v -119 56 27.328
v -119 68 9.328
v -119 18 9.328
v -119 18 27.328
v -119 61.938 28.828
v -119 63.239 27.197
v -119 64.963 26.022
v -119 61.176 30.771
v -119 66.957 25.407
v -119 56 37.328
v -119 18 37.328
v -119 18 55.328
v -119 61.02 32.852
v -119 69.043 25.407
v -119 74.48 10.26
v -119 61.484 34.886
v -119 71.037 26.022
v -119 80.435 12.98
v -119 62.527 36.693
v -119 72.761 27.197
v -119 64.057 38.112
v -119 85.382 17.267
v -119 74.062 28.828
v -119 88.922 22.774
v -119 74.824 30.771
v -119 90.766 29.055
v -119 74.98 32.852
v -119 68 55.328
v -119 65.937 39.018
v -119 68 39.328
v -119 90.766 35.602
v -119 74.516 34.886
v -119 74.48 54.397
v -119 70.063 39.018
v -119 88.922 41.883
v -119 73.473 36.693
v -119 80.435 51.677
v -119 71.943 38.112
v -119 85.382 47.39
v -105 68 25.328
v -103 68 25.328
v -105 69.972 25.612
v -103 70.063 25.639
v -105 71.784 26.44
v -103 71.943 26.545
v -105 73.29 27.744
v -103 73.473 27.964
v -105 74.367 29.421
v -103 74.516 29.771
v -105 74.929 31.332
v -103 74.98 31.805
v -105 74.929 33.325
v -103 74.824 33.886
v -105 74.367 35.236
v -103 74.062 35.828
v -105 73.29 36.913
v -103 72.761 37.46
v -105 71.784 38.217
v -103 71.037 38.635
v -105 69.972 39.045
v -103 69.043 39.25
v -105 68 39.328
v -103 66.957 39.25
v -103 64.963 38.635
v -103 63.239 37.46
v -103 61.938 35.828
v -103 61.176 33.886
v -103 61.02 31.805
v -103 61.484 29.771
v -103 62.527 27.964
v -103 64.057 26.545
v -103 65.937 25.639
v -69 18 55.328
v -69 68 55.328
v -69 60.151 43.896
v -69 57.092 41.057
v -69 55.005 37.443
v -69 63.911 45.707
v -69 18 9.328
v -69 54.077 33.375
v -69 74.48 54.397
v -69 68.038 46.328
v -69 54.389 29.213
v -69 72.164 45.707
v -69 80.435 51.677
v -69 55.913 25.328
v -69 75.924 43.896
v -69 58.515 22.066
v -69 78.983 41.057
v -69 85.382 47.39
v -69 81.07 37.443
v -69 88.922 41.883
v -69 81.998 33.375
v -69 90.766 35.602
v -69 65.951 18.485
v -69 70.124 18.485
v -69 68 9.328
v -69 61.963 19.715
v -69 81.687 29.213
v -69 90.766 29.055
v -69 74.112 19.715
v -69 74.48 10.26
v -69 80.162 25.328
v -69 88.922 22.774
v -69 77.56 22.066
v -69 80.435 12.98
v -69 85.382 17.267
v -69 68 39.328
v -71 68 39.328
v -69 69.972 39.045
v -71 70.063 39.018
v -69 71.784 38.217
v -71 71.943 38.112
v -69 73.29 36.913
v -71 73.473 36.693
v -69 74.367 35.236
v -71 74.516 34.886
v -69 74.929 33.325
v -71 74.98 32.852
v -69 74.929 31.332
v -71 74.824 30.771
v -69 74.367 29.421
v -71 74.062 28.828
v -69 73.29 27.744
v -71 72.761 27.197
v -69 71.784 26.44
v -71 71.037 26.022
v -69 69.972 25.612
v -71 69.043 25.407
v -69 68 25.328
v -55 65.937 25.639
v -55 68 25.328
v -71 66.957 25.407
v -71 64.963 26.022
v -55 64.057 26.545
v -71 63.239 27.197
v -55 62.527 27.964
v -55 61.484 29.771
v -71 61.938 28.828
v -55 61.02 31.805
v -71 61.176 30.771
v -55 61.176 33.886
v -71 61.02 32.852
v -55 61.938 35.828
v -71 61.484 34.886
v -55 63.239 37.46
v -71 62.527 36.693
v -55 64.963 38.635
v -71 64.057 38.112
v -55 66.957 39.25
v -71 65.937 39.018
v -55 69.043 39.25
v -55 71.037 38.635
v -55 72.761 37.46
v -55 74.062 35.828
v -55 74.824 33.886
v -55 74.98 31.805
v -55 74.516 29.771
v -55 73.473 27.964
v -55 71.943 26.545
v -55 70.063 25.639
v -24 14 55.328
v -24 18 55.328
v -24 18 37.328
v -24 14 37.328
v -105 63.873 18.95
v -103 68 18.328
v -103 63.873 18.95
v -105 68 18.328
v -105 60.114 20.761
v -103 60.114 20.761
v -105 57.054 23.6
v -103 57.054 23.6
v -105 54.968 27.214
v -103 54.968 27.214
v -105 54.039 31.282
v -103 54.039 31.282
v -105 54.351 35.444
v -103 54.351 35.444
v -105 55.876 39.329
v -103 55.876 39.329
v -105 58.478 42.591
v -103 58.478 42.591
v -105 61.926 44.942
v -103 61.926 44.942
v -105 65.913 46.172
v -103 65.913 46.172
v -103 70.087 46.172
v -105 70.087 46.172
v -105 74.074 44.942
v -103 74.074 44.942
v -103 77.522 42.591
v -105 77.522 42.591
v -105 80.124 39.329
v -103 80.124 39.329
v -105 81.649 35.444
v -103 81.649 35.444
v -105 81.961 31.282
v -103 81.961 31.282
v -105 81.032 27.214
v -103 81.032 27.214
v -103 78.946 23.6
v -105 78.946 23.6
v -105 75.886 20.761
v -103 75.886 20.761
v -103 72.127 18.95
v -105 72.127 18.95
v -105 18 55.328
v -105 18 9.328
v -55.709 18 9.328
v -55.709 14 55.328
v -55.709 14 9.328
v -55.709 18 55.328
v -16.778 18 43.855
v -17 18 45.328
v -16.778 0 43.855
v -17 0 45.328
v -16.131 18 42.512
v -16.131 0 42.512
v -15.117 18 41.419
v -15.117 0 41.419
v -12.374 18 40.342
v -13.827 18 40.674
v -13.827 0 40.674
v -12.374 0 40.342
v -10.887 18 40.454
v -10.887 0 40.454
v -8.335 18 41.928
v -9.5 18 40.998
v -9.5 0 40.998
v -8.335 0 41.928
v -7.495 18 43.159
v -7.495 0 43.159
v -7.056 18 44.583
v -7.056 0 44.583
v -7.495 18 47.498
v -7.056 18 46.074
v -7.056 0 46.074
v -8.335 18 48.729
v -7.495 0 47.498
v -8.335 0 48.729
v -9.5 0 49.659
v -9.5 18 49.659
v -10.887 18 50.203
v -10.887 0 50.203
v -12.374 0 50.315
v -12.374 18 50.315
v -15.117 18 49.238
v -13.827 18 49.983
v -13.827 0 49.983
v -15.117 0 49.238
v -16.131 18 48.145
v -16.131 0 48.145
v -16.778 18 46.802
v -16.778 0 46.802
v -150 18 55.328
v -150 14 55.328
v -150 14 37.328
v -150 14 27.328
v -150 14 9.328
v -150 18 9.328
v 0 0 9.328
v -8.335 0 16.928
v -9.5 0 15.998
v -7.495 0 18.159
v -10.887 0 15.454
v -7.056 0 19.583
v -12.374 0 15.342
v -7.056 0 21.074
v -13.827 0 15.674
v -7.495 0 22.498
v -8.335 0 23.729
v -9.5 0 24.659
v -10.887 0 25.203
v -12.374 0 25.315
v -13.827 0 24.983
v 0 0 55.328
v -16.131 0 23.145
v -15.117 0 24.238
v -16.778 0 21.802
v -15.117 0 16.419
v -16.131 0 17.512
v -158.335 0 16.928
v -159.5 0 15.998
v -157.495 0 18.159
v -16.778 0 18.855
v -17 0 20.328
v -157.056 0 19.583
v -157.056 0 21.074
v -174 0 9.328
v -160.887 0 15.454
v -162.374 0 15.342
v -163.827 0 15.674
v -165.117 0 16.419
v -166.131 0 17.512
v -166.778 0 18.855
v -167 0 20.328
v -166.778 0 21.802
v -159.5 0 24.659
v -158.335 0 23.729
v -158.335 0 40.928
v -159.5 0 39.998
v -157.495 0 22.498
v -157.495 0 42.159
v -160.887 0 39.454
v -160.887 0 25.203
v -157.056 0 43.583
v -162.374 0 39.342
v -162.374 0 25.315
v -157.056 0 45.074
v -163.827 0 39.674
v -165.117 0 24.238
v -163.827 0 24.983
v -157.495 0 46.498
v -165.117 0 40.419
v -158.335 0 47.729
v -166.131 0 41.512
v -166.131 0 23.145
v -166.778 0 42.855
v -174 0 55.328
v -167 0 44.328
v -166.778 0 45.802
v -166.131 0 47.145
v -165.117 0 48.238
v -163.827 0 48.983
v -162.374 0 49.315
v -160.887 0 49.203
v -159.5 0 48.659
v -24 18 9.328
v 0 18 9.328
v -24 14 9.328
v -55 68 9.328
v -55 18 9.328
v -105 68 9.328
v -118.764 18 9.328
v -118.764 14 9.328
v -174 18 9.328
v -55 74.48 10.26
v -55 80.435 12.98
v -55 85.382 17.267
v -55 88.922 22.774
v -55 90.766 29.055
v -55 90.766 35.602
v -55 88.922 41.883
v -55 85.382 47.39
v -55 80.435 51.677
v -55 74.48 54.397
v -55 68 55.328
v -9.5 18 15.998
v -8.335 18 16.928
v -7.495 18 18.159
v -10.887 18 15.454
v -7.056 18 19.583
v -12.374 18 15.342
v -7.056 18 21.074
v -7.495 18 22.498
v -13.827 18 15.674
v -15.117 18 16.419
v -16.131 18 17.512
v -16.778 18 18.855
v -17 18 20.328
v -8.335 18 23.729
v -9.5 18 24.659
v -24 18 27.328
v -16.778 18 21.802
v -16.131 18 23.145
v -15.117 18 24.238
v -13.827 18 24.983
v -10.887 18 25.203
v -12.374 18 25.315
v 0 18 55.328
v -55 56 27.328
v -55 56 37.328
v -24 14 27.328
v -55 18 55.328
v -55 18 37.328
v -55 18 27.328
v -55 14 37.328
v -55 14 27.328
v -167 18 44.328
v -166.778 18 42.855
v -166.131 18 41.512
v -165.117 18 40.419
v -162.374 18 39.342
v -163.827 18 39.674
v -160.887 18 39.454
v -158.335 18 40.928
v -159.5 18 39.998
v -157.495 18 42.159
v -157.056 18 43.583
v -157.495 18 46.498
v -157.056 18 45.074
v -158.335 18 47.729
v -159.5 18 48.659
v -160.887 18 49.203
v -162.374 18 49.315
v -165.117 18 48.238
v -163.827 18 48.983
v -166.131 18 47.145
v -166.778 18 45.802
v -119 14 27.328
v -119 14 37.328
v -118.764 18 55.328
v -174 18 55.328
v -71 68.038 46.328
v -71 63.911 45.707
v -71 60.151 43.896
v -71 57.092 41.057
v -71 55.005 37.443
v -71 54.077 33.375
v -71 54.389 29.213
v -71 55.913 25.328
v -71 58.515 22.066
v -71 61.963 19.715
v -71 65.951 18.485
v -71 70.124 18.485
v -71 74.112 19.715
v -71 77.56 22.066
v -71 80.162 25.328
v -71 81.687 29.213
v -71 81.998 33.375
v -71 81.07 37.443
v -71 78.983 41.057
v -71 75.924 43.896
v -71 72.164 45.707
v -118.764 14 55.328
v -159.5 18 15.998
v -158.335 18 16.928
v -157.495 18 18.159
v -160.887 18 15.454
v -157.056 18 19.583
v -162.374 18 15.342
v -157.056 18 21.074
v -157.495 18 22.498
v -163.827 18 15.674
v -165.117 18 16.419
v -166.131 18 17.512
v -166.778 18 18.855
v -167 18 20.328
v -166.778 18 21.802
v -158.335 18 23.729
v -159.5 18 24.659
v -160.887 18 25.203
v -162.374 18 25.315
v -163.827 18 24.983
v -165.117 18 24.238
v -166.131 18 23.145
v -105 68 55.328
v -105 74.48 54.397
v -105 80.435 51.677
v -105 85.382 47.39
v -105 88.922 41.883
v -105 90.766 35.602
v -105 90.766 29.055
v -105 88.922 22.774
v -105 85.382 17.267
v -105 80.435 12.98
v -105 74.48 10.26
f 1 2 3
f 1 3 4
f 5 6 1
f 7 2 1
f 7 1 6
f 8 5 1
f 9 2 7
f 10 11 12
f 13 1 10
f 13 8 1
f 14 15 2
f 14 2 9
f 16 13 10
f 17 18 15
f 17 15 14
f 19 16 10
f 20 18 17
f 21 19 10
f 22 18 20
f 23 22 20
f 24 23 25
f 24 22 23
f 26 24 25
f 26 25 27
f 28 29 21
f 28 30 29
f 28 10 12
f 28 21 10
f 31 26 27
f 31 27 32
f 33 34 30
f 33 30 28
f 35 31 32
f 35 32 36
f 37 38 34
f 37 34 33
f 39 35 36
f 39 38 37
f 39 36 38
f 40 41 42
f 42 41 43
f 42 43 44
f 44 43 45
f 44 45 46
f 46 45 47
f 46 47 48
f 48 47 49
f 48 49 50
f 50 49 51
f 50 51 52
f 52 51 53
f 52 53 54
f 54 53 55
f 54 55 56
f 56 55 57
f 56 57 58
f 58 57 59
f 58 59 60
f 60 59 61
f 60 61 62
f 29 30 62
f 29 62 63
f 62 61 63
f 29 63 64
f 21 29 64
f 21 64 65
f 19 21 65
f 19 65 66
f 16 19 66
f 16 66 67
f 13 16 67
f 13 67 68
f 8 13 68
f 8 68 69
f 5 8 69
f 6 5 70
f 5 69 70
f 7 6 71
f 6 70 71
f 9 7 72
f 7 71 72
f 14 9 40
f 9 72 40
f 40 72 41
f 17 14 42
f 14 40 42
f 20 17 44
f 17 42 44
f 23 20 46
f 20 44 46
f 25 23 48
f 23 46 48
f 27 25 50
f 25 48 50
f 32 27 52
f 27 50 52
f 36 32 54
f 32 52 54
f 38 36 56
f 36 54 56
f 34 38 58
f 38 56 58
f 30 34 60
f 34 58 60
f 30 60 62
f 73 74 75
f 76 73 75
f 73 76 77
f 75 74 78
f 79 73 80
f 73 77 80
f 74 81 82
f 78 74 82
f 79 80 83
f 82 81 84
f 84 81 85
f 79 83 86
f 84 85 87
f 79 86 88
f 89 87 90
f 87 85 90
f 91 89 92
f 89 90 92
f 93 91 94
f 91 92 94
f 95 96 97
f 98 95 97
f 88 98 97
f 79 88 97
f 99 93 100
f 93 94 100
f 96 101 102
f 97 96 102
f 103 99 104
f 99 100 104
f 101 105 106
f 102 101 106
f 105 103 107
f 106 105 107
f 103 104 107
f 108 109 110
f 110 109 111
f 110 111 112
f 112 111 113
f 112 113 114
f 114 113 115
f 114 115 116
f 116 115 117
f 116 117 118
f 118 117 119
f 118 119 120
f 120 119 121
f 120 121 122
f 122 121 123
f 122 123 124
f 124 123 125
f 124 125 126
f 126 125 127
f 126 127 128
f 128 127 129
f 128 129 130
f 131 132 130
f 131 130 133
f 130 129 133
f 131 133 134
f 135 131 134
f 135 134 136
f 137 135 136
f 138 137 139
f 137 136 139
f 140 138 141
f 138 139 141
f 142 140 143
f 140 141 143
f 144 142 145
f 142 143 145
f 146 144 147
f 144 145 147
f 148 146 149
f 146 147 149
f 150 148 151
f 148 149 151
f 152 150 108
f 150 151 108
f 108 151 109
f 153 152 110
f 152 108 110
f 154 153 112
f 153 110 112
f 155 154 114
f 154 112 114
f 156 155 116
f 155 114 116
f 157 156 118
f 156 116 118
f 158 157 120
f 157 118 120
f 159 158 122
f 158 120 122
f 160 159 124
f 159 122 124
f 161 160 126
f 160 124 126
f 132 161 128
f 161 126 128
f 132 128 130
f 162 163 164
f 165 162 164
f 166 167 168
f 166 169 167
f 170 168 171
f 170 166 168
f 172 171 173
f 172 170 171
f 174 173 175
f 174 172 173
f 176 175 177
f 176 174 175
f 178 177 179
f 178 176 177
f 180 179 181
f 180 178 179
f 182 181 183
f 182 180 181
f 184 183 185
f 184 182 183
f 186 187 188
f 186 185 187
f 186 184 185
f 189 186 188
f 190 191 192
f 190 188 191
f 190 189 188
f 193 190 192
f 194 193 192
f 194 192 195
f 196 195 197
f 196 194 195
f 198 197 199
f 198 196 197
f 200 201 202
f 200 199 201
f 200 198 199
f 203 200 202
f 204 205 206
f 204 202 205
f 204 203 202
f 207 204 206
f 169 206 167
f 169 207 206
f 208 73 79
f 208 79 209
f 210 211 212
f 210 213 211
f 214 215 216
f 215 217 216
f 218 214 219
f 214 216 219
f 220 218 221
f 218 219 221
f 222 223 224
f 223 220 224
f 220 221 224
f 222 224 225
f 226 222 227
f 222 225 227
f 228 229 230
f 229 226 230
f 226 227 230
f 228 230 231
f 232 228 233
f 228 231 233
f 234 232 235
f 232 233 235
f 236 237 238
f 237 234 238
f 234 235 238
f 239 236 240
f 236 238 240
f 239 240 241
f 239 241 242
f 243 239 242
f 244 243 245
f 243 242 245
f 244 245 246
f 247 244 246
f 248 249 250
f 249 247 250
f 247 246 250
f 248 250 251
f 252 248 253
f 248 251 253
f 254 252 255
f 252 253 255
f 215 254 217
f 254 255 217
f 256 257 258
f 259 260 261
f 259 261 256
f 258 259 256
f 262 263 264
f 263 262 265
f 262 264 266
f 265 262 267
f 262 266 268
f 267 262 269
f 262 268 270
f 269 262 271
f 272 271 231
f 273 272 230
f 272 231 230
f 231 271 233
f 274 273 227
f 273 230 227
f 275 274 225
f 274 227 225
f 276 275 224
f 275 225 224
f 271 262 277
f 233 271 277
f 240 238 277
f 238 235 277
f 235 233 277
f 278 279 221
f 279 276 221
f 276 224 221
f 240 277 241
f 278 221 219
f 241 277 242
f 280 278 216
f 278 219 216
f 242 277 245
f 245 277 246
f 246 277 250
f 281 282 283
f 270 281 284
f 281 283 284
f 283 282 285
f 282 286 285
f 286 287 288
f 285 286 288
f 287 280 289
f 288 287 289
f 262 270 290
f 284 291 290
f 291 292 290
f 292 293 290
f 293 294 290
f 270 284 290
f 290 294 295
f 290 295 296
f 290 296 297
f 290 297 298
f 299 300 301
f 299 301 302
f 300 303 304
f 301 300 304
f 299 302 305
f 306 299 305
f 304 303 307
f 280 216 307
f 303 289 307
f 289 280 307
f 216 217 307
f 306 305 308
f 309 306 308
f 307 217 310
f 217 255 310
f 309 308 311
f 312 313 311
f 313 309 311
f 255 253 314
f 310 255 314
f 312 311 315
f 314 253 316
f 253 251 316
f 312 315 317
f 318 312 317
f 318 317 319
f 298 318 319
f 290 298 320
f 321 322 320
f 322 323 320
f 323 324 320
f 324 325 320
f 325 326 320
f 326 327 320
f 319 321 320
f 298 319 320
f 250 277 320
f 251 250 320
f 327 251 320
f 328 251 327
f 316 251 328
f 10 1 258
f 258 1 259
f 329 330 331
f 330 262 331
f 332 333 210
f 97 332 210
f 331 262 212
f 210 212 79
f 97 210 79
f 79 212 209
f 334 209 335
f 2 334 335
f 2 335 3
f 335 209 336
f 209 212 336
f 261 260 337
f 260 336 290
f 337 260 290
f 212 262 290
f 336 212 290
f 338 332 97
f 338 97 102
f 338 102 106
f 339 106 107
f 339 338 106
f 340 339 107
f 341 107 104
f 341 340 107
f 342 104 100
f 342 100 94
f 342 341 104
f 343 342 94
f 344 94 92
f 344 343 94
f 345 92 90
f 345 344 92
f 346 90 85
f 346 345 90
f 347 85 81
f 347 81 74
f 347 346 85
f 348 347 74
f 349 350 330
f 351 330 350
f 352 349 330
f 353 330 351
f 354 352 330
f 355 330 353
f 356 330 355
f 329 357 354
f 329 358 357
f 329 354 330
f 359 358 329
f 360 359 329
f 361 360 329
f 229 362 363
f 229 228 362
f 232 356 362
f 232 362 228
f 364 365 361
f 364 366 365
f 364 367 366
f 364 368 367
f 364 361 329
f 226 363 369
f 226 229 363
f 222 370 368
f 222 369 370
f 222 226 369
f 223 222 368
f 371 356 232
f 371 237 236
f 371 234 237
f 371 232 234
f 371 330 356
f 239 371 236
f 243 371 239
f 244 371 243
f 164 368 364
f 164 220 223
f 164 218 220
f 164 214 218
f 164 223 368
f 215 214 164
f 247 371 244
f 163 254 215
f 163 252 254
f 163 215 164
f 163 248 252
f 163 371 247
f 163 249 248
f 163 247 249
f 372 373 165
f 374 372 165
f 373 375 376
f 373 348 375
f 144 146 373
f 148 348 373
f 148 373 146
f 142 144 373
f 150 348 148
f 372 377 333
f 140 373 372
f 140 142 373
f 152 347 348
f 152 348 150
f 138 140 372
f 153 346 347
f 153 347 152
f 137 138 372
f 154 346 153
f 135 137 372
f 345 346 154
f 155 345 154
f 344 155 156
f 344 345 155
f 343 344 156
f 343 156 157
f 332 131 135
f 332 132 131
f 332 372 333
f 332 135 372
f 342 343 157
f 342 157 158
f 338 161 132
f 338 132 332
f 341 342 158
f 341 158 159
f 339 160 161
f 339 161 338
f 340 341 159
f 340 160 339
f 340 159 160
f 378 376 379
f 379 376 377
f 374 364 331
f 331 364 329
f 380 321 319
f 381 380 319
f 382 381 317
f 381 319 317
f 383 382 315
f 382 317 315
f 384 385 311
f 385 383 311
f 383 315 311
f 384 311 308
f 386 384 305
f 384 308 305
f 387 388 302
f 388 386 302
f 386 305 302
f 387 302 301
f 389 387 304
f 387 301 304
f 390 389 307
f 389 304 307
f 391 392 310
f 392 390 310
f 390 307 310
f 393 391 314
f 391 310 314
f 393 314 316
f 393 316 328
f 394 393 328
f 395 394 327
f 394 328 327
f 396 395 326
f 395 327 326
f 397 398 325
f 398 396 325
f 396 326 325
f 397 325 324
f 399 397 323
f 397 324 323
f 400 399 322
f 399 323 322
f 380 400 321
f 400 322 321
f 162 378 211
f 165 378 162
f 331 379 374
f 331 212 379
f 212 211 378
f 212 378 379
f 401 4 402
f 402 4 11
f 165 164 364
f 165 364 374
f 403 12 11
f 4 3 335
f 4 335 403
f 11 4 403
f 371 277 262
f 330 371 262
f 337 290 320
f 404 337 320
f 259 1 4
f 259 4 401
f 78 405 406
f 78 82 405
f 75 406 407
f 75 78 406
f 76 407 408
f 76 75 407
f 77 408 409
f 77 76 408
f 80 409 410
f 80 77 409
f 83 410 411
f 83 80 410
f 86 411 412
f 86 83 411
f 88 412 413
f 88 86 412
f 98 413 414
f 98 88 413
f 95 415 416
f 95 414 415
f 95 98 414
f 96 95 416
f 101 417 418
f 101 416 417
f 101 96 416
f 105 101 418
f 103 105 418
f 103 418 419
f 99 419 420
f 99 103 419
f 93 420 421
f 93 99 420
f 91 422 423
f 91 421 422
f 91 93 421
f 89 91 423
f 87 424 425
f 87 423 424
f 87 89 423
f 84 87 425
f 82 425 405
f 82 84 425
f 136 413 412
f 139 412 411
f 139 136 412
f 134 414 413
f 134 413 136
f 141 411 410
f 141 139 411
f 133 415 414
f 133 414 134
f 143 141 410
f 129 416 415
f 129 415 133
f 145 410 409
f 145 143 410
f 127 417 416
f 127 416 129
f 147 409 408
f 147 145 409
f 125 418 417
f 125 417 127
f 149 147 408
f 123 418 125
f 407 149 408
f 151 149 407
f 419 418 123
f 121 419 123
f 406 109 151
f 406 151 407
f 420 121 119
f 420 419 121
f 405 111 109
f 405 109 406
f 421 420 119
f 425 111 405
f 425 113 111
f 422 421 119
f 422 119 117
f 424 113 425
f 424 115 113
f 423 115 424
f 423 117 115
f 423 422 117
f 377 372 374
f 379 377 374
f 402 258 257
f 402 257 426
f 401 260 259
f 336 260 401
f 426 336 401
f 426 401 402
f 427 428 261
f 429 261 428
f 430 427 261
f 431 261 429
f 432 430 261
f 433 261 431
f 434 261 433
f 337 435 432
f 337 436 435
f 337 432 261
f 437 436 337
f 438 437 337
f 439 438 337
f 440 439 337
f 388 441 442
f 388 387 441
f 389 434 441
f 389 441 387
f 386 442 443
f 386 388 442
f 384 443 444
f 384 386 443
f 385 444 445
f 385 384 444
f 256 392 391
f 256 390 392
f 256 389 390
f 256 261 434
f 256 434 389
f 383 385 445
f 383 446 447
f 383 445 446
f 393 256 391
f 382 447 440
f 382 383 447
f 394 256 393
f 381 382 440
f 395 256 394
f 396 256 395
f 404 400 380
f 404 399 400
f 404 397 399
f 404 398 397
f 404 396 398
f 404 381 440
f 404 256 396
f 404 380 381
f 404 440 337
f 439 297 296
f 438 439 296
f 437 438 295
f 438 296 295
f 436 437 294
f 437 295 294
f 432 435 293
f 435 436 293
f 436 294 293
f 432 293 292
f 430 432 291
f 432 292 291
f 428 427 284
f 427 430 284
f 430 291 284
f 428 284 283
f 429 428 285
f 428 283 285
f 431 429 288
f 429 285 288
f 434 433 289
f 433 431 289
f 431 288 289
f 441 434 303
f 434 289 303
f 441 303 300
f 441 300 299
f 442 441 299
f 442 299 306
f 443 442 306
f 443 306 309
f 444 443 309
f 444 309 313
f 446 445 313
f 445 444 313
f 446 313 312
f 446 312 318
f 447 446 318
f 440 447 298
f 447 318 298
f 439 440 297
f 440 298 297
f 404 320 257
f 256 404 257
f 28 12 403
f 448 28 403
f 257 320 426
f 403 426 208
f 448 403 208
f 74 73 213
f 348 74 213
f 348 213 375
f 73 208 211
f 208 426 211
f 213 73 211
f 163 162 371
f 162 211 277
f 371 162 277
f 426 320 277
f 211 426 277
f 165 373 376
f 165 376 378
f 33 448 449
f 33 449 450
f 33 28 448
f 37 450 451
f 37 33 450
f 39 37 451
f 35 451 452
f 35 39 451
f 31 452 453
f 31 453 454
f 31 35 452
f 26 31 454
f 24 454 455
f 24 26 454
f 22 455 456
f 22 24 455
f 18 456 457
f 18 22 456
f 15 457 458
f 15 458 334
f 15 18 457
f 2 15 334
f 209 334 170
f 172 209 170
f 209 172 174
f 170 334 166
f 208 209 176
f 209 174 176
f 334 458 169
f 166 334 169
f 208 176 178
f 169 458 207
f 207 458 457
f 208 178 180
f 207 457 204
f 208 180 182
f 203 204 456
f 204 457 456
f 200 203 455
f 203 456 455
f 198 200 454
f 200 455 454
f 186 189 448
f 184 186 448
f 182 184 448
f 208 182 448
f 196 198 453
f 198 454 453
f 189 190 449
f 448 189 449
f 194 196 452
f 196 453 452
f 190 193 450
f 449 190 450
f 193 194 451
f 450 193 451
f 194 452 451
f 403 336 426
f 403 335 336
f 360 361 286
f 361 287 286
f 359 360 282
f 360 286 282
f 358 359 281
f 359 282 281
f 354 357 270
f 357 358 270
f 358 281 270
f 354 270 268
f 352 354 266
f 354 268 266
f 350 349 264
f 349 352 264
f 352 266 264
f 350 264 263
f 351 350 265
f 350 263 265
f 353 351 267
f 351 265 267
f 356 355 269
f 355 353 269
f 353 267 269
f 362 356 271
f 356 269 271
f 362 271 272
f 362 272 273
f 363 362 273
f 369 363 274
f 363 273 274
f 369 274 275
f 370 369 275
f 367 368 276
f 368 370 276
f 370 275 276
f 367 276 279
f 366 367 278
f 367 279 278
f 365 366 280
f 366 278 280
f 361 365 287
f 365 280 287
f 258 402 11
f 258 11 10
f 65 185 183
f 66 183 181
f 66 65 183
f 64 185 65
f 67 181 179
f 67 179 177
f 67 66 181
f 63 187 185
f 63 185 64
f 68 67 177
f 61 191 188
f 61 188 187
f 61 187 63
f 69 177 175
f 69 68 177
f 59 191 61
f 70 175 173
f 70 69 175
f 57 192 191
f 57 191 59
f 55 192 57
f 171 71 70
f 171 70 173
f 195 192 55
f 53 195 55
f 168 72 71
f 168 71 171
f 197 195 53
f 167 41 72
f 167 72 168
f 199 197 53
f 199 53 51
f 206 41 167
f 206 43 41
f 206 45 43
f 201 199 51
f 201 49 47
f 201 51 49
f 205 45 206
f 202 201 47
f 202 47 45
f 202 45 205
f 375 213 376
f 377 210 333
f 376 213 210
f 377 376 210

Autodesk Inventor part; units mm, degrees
ref_plane "YZ Plane" through (0, 0, 0) normal (1, 0, 0) x (0, 1, 0)
ref_plane "XZ Plane" through (0, 0, 0) normal (0, 1, 0) x (-1, 0, 0)
ref_plane "XY Plane" through (0, 0, 0) normal (0, 0, 1) x (1, 0, 0)
sketch "Sketch1" plane through (0, 0, 0) normal (0, 1, 0) x (-1, 0, 0)
  line L0 (0, 9.3285) -> (174, 9.3285)
  line L1 (174, 9.3285) -> (174, 55.3285)
  line L2 (174, 55.3285) -> (0, 55.3285)
  line L3 (0, 55.3285) -> (0, 9.3285)
  circle A0 centre (12, 45.3285) radius 5
  circle A1 centre (162, 44.3285) radius 5
  circle A2 centre (162, 20.3285) radius 5
  circle A3 centre (12, 20.3285) radius 5
  point P0 (0, 0)
  dimension "d0" = 174
  dimension "d1" = 46
  dimension "d2" = 10
  dimension "d3" = 12
  dimension "d4" = 10
  dimension "d5" = 10
  dimension "d6" = 11
  dimension "d7" = 12
  dimension "d8" = 10
  dimension "d9" = 12
  dimension "d10" = 11
  dimension "d11" = 10
  dimension "d12" = 12
  dimension "d13" = 11
extrude "Extrusion1" add sketch "Sketch1" along normal blind 18
ref_plane "Work Plane1" through (-55, 0, 55.3285) normal (1, 0, 0) x (0, 0, -1)
sketch "Sketch2" plane through (-55, 0, 55.3285) normal (1, 0, 0) x (0, 0, -1)
  line L0 (46, 18) -> (0, 18) projected
  line L1 (0, 18) -> (0, 68)
  line L2 (46, 18) -> (46, 68)
  circle A0 centre (23, 68) radius 7
  arc A1 (46, 68) -> (0, 68) centre (23, 68) ccw
  point P0 (55.3285, 0)
  dimension "d17" = 50
  dimension "d18" = 50
  dimension "d20" = 14
extrude "Extrusion2" add sketch "Sketch2" against normal blind 14
ref_plane "Work Plane2" through (-119, 0, 9.3285) normal (-1, 0, 0) x (0, 0, 1)
sketch "Sketch3" plane through (-119, 0, 9.3285) normal (-1, 0, 0) x (0, 0, 1)
  line L0 (0, 0) -> (0, 18) projected
  line L1 (0, 18) -> (0, 68)
  circle A0 centre (23, 68) radius 7 projected
  circle A1 centre (23, 68) radius 7
  line L2 (46, 0) -> (46, 18) projected
  line L3 (46, 18) -> (46, 68) projected
  line L4 (46, 18) -> (46, 68)
  arc A2 (46, 68) -> (0, 68) centre (23, 68) ccw
  line L5 (0, 18) -> (46, 18)
  point P0 (-9.3285, 0)
  dimension "d24" = 50
  dimension "d26" = 50
extrude "Extrusion3" add sketch "Sketch3" against normal blind 14
sketch "Sketch4" plane through (-105, 0, 9.3285) normal (1, 0, 0) x (0, 0, -1)
  line L0 (-46, 19.0772) -> (-46, 69.0772)
  circle A0 centre (-23, 68) radius 14
  point P0 (9.3285, 0)
  dimension "d31" = 28
extrude "Extrusion4" add sketch "Sketch4" along normal blind 2
sketch "Sketch5" plane through (-103, 68, 32.3285) normal (1, 0, 0) x (0, 0, -1)
  circle A0 centre (0, 0) radius 14 projected
  circle A1 centre (0, 0) radius 7
  point P0 (32.3285, -68)
  dimension "d34" = 14
extrude "Extrusion5" cut sketch "Sketch5" against normal blind 50 contours A1
sketch "Sketch6" plane through (0, 18, 0) normal (0, 1, 0) x (1, 0, 0)
  line L0 (0.0001, -55.3285) -> (-23.9999, -55.3285)
  line L1 (-23.9999, -55.3285) -> (-23.9999, -9.3285)
  line L2 (0, -9.3285) -> (-174, -9.3285) projected
  line L3 (-55.709, -55.3285) -> (-23.9999, -55.3285)
  line L4 (-23.9999, -9.3285) -> (-55.709, -9.3285)
  line L5 (-55.709, -55.3285) -> (-55.709, -9.3285)
  line L6 (-174, -55.3285) -> (-150, -55.3285)
  line L7 (-150, -55.3285) -> (-150, -9.3285)
  line L8 (-150, -55.3285) -> (-118.7635, -55.3285)
  line L9 (-174, -55.3285) -> (0, -55.3285) projected
  line L10 (-118.7635, -9.3285) -> (-118.7635, -55.3285)
  line L11 (-118.7635, -9.3285) -> (-150, -9.3285)
  point P0 (0, 0)
  dimension "d37" = 24
  dimension "d38" = 24
extrude "Extrusion6" cut sketch "Sketch6" against normal blind 4 contours L3 L5 L2 L1 | L8 L7 L2 L10
sketch "Sketch7" plane through (-55, 0, 55.3285) normal (1, 0, 0) x (0, 0, -1)
  line L0 (0, 18) -> (0, 68)
  line L1 (23, 56) -> (28, 56)
  line L2 (23, 56) -> (18, 56)
  line L3 (18, 56) -> (18, 14)
  line L4 (0, 14) -> (46, 14) projected
  line L5 (28, 56) -> (28, 14)
  line L6 (18, 14) -> (28, 14)
  point P0 (55.3285, 0)
  dimension "d45" = 5
  dimension "d46" = 5
extrude "Extrusion7" add sketch "Sketch7" along normal blind 31
sketch "Sketch8" plane through (-55, 14, 37.3285) normal (0, 0, 1) x (1, 0, 0)
  line L0 (0, 4) -> (0, 42) projected
  line L1 (31, 42) -> (31, 0) projected
  line L2 (0, 42) -> (31, 0)
  line L3 (31, 0) -> (31, 42)
  line L4 (31, 42) -> (0, 42)
  point P0 (55, -14)
extrude "Extrusion8" cut sketch "Sketch8" against normal blind 31
sketch "Sketch9" plane through (-119, 0, 9.3285) normal (-1, 0, 0) x (0, 0, 1)
  line L0 (0, 18) -> (0, 14) projected
  line L1 (0, 18) -> (0, 68)
  line L2 (28, 56) -> (18, 56) projected
  line L3 (23, 56) -> (28, 56)
  line L4 (23, 56) -> (18, 56)
  line L5 (18, 56) -> (18, 14)
  line L6 (0, 14) -> (46, 14) projected
  line L7 (28, 14) -> (28, 56)
  line L8 (28, 14) -> (18, 14)
  point P0 (-9.3285, 0)
  dimension "d55" = 5
extrude "Extrusion9" add sketch "Sketch9" along normal blind 31
sketch "Sketch10" plane through (-119, 14, 27.3285) normal (0, 0, -1) x (-1, 0, 0)
  line L0 (0, 42) -> (31, 0)
  line L1 (31, 0) -> (31, 42)
  line L2 (31, 42) -> (0, 42)
  point P0 (-119, -14)
extrude "Extrusion10" cut sketch "Sketch10" against normal blind 31
sketch "Sketch11" plane through (-69, 0, 55.3285) normal (-1, 0, 0) x (0, 0, 1)
  circle A0 centre (-23, 68.0376) radius 14
  point P0 (-55.3285, 0)
  dimension "d60" = 28
extrude "Extrusion11" add sketch "Sketch11" along normal blind 2
sketch "Sketch12" plane through (-71, 68.0376, 32.3285) normal (-1, 0, 0) x (0, 0, 1)
  circle A0 centre (0, -0.0376) radius 7 projected
  circle A1 centre (0, -0.0376) radius 7
  point P0 (-32.3285, -68.0376)
  dimension "d63" = 14
extrude "Extrusion12" cut sketch "Sketch12" against normal blind 50
properties part number "5 - Part1"
